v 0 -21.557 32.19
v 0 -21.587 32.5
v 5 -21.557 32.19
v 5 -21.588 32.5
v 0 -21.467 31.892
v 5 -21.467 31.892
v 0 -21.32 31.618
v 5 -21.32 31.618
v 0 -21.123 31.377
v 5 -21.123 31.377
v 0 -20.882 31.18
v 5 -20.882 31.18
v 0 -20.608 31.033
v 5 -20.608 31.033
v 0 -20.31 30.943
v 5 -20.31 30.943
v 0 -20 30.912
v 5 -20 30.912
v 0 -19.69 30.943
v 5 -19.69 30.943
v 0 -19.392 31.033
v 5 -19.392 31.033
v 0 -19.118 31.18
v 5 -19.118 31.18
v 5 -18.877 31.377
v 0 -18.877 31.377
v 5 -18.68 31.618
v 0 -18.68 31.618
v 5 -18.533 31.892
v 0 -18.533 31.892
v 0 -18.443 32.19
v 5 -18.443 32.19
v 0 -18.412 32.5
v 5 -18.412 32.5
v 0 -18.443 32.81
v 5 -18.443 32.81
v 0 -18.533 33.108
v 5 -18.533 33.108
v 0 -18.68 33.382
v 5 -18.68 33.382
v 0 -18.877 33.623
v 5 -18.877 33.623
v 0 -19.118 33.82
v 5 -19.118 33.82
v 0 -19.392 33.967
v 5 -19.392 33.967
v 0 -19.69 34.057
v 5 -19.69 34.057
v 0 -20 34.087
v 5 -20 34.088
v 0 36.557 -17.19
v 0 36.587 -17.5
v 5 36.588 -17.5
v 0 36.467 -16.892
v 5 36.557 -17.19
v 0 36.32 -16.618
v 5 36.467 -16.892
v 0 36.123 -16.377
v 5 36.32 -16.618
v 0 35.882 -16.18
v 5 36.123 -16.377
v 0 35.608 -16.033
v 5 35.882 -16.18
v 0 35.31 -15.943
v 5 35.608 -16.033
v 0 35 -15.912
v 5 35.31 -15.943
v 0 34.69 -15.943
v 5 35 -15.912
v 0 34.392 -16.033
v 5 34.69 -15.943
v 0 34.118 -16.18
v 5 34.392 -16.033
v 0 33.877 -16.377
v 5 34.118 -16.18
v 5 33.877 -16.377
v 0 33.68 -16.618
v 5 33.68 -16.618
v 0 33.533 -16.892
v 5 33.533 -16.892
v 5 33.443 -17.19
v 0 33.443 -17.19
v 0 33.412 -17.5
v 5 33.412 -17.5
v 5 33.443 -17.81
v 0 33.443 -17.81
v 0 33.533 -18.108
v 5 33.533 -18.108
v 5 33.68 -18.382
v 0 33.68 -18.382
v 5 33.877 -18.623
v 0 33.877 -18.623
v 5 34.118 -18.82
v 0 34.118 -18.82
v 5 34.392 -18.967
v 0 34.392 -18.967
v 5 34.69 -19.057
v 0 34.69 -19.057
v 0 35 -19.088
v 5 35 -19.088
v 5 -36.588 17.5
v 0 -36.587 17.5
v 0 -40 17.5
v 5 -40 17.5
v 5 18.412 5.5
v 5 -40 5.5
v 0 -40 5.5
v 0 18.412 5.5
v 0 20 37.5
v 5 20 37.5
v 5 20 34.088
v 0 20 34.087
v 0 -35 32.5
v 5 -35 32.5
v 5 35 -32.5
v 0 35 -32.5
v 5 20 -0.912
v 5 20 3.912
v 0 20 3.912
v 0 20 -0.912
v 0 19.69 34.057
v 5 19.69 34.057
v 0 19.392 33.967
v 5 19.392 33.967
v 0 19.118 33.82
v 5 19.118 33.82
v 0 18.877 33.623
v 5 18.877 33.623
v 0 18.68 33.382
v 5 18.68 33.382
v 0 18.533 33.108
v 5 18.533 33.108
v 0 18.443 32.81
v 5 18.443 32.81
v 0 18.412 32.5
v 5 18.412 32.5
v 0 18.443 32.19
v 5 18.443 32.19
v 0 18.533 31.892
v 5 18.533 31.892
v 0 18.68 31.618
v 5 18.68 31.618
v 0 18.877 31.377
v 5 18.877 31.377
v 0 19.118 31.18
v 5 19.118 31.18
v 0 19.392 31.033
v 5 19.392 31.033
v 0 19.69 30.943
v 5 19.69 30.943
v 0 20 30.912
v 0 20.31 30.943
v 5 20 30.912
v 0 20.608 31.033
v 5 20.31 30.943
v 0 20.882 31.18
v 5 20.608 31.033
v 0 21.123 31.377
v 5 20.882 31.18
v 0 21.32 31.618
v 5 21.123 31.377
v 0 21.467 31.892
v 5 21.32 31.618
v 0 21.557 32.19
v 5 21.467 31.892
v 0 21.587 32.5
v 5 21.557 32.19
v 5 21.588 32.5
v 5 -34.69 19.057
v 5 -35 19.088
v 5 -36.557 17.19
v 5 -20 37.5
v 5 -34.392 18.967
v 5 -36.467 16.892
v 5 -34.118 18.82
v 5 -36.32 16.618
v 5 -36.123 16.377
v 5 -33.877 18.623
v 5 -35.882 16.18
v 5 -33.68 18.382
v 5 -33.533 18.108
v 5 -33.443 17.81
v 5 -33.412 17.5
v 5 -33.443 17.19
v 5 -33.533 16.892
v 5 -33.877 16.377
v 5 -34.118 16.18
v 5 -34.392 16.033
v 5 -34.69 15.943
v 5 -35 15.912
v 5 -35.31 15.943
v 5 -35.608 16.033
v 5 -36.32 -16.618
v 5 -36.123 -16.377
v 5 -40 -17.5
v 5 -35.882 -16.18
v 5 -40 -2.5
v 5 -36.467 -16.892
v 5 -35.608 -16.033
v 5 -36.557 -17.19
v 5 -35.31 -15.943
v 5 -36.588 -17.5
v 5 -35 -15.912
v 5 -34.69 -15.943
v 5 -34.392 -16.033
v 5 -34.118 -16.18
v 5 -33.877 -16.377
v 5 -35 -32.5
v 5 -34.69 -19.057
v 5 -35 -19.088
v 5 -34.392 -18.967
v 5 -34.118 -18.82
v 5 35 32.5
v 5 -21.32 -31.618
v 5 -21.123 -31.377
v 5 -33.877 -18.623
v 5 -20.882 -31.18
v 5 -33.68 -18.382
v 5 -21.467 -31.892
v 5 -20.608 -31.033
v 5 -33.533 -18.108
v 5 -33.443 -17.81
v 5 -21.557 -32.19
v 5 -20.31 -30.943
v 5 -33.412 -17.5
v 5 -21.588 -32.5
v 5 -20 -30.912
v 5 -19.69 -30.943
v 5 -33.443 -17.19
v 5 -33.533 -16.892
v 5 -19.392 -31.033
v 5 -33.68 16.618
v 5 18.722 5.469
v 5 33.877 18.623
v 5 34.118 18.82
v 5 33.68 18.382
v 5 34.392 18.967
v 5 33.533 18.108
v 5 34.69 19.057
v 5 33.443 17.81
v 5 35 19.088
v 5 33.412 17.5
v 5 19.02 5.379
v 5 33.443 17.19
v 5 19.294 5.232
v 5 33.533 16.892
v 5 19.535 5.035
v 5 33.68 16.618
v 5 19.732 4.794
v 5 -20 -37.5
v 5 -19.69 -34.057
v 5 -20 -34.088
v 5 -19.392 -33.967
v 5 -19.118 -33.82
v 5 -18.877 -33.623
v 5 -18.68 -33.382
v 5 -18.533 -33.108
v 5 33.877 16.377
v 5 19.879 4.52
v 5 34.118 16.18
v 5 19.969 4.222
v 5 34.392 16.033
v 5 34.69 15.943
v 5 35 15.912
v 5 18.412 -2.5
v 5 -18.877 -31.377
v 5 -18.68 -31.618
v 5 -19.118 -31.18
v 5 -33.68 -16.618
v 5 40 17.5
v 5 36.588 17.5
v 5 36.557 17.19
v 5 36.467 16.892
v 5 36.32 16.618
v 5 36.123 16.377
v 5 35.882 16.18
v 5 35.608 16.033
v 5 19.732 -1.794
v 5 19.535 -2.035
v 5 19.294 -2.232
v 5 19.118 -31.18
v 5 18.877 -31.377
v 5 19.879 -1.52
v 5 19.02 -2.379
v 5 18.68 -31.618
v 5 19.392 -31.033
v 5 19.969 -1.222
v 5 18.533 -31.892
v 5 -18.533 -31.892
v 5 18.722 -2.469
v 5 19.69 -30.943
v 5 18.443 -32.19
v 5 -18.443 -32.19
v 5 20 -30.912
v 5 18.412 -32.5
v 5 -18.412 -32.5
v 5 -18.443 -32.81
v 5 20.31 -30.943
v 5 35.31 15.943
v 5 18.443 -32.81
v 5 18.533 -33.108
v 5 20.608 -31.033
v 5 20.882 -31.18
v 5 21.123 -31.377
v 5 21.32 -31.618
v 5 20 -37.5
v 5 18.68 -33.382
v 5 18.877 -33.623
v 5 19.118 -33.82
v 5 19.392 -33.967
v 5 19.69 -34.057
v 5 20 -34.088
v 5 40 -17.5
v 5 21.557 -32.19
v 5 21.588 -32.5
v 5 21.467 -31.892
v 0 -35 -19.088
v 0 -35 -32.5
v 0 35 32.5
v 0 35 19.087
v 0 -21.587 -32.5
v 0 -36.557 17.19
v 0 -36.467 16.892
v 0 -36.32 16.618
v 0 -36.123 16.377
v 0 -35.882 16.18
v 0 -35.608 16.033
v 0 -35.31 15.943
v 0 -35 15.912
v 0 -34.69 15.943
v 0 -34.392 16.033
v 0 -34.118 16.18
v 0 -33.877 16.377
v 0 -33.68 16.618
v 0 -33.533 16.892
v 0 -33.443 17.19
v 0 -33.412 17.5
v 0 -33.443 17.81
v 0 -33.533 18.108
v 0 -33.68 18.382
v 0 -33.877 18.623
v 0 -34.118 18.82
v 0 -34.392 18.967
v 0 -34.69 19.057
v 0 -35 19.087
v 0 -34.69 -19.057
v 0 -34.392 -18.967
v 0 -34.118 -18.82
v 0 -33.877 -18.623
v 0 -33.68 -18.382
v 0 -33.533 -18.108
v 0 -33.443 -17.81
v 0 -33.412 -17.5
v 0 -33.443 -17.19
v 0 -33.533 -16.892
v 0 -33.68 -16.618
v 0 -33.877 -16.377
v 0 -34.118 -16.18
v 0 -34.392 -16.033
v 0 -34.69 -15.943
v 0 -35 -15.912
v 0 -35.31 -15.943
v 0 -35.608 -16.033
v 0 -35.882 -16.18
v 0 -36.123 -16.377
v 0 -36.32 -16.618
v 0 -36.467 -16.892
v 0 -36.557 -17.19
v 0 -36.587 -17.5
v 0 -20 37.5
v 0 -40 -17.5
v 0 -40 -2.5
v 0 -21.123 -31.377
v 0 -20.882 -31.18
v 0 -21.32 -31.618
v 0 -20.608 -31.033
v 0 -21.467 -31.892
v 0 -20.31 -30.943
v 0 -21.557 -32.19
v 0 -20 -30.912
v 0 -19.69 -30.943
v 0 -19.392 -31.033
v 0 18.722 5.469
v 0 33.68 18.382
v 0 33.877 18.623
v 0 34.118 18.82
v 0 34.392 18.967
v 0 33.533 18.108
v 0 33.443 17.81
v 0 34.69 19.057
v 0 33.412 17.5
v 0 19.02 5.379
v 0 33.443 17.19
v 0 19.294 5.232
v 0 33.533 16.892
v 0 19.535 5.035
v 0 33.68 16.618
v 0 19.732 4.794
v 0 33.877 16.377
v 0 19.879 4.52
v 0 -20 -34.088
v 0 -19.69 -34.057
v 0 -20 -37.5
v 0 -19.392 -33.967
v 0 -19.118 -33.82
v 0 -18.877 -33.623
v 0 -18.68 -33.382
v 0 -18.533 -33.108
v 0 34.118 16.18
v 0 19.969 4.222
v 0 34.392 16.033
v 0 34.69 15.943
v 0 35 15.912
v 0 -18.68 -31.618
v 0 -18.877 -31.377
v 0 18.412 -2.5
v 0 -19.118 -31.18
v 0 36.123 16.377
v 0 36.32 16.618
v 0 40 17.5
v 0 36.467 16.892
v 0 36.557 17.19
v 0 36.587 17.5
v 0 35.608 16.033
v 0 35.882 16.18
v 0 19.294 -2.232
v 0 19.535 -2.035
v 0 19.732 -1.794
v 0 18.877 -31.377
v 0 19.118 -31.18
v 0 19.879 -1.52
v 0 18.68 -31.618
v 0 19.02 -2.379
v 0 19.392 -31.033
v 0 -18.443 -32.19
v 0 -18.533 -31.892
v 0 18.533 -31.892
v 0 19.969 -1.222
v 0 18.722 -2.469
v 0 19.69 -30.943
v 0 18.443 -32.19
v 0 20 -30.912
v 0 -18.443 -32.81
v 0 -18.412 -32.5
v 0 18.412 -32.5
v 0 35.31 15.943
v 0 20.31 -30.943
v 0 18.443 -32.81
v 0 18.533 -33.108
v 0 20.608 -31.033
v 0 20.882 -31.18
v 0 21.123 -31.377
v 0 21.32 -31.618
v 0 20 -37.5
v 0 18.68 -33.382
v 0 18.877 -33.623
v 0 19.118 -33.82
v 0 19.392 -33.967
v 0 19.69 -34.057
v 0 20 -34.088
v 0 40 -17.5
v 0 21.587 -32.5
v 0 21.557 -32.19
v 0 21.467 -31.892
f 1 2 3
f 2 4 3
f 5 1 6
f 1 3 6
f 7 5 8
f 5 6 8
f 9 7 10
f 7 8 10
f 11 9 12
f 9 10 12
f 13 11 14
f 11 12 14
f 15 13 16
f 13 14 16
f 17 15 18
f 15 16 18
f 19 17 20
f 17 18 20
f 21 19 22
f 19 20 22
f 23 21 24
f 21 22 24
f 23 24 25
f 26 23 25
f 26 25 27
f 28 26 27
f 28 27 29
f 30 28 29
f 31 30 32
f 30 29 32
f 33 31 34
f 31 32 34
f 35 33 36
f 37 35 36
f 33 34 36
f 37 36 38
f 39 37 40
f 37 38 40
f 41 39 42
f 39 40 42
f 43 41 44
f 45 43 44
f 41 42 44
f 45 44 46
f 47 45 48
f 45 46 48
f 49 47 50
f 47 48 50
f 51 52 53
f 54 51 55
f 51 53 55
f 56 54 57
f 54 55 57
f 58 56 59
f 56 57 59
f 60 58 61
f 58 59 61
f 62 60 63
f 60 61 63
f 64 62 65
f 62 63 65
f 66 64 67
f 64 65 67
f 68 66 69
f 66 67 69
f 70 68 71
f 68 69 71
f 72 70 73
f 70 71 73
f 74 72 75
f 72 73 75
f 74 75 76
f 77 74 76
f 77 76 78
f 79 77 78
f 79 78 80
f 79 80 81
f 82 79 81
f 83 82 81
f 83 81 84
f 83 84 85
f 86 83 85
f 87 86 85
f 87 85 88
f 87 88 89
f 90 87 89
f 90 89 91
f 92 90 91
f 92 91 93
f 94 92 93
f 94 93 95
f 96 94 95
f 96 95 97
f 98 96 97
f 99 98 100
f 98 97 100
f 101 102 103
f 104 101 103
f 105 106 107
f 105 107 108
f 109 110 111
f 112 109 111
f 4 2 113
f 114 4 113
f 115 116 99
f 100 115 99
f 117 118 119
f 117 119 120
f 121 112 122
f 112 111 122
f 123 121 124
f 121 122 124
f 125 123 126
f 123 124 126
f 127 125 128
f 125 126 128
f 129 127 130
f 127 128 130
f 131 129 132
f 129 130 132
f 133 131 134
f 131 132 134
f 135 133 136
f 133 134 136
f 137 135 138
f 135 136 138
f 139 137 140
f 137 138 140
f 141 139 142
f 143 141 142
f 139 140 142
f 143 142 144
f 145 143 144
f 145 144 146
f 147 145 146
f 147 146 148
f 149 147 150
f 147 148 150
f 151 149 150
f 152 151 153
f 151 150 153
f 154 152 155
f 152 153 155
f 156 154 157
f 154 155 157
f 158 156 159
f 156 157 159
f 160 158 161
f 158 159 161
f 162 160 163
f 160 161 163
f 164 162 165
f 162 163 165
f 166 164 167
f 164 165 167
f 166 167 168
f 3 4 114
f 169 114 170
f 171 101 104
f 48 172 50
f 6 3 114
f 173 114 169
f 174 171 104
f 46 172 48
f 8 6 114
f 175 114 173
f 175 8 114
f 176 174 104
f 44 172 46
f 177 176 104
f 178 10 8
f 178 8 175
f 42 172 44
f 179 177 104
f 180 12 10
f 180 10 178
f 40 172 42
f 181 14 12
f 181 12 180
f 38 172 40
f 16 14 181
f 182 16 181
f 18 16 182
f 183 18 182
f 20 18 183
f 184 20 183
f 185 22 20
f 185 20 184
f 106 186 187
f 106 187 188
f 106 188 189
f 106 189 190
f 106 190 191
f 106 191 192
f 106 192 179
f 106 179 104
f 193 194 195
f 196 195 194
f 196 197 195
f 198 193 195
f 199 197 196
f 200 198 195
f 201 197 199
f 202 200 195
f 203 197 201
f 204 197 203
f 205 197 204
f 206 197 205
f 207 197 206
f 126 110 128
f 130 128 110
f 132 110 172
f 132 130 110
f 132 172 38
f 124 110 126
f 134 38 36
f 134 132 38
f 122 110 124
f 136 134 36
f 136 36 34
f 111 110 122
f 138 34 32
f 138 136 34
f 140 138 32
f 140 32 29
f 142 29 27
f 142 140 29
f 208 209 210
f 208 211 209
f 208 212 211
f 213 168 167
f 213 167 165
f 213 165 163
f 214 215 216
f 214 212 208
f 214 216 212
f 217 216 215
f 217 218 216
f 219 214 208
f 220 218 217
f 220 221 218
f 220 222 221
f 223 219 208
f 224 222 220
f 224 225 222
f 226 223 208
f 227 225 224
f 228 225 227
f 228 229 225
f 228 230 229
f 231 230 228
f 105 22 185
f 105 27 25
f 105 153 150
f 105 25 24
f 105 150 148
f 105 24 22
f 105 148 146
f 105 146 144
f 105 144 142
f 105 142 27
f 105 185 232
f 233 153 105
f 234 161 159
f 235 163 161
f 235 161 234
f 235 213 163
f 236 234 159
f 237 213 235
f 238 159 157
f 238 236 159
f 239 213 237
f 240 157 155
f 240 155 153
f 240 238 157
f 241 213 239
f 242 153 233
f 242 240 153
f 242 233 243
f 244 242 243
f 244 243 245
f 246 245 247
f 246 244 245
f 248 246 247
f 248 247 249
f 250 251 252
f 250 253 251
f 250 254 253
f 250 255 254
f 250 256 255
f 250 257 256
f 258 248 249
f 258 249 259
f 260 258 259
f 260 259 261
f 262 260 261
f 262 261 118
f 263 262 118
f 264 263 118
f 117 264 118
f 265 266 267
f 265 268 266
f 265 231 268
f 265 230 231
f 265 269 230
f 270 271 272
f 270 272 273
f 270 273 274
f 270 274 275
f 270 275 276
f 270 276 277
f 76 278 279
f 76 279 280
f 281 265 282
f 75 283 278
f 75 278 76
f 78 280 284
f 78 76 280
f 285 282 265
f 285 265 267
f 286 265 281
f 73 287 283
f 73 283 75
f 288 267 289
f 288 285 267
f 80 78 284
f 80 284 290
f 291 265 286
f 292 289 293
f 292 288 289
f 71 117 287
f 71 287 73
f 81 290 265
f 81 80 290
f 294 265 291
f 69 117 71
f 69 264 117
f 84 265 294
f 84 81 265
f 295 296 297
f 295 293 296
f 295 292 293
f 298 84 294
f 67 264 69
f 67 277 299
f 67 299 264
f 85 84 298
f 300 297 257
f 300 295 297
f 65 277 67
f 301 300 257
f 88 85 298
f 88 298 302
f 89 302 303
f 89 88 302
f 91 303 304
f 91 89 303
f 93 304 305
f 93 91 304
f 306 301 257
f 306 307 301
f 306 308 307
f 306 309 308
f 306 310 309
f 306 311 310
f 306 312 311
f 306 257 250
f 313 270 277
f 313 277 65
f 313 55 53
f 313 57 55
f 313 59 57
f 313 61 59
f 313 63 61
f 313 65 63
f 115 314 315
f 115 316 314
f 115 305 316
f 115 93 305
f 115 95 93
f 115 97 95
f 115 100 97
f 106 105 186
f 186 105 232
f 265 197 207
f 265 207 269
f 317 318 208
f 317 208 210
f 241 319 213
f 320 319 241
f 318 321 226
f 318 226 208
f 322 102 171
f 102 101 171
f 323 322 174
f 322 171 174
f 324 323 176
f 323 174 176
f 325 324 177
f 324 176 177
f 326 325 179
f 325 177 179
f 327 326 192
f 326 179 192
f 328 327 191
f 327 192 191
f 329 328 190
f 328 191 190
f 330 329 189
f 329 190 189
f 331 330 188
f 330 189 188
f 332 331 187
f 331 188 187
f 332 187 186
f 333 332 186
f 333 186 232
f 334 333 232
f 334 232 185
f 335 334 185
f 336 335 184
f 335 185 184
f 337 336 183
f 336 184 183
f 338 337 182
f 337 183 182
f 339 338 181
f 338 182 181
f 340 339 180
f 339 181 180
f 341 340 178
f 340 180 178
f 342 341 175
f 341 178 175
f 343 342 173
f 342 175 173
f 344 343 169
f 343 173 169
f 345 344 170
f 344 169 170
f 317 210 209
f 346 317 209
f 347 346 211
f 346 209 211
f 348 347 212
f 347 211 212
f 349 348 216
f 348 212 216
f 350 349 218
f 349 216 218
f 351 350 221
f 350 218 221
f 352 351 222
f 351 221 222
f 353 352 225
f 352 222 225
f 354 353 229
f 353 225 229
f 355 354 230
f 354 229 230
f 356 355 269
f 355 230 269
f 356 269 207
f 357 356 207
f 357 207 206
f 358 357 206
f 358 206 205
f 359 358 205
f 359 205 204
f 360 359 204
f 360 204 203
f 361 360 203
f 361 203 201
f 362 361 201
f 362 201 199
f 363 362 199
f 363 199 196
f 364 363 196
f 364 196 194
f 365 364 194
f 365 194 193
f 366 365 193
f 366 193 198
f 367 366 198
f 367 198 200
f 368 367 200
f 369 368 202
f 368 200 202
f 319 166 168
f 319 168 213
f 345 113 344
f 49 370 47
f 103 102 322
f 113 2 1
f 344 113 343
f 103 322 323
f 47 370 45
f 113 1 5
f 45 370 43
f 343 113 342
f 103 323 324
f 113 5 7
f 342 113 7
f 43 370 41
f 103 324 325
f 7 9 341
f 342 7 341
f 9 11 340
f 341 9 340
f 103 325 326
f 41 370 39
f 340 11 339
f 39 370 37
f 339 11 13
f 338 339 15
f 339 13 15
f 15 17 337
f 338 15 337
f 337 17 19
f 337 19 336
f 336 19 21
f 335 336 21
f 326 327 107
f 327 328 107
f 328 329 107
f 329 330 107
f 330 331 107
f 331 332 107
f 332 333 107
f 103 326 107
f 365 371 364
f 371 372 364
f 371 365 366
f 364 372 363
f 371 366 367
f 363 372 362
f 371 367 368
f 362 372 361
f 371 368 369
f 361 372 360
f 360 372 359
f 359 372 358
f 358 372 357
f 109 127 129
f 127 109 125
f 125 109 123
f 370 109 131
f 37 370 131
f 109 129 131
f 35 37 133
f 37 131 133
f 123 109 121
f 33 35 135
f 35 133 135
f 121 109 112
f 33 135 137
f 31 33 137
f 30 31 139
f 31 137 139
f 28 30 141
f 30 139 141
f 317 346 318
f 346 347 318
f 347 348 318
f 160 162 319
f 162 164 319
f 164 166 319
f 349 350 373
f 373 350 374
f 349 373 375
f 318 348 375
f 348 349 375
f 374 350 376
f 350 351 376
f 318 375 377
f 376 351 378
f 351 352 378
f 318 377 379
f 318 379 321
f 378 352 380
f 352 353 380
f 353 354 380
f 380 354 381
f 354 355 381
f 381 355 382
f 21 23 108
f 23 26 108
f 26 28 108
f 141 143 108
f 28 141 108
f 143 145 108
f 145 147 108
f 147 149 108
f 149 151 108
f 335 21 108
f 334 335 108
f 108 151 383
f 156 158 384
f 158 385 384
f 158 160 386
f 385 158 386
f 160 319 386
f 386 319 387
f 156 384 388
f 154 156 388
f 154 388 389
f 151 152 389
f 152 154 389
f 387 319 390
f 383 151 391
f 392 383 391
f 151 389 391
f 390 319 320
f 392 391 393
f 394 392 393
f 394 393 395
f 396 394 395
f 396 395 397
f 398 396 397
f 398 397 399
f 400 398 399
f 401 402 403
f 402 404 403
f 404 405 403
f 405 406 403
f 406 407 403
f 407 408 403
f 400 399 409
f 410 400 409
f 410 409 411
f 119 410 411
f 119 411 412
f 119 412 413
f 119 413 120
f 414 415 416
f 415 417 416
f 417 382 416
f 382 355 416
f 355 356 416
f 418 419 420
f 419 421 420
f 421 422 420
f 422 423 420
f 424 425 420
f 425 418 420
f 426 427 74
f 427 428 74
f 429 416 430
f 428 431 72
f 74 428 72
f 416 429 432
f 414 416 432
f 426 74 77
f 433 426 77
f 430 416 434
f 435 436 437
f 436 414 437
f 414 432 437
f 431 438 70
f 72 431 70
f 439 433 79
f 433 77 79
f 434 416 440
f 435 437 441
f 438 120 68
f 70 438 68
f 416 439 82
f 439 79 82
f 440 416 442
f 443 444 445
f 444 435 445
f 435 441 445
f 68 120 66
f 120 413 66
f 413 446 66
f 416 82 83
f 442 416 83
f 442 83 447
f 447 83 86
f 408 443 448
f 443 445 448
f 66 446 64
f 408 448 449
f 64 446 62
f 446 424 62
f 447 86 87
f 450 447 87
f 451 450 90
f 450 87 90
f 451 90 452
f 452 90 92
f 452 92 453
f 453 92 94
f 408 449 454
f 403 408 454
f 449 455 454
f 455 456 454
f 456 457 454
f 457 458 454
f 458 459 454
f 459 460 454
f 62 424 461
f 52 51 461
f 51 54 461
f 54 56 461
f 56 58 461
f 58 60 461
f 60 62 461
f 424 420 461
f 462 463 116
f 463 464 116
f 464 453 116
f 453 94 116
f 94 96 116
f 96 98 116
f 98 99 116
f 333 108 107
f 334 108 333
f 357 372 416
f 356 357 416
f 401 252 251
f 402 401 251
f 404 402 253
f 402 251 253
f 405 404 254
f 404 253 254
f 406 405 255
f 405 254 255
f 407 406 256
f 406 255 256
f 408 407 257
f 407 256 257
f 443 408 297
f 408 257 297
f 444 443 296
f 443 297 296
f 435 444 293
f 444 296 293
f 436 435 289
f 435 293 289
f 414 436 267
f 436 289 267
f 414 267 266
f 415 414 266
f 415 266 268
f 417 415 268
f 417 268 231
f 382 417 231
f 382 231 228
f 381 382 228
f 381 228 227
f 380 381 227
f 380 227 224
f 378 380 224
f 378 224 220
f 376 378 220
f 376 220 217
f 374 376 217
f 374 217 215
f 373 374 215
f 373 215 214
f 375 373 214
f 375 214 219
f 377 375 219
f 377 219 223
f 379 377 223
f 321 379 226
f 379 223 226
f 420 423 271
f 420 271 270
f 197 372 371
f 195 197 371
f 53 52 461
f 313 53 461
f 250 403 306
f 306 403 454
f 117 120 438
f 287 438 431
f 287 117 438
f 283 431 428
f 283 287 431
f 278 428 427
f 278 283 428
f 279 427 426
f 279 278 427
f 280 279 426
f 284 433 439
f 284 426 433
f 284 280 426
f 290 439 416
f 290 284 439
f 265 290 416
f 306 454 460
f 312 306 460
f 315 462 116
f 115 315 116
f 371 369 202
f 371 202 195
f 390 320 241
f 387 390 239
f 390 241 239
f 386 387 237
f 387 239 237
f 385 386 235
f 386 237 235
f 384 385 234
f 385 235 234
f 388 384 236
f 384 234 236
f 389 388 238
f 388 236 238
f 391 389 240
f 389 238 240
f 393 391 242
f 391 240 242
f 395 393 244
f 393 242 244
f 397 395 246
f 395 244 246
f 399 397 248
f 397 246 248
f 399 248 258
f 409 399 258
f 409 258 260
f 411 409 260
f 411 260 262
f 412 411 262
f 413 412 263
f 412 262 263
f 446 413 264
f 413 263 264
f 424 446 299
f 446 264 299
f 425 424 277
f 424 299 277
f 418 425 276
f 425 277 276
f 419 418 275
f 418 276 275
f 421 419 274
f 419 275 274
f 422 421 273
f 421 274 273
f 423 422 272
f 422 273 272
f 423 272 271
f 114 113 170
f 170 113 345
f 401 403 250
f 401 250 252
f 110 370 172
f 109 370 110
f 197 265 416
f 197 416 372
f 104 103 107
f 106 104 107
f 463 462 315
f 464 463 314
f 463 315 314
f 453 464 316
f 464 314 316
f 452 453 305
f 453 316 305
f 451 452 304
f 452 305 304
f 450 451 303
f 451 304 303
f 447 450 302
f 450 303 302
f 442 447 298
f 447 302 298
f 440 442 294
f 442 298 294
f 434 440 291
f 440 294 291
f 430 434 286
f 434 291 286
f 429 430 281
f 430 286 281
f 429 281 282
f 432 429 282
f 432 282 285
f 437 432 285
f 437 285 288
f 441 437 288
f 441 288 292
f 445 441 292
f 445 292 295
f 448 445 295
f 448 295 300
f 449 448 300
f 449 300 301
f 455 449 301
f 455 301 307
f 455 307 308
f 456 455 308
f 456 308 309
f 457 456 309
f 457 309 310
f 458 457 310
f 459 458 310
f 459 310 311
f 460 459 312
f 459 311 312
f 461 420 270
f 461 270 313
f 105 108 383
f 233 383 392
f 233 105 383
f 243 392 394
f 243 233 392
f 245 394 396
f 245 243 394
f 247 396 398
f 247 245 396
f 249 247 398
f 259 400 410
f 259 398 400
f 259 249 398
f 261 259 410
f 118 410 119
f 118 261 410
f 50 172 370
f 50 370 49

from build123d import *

# Parameters (mm, degrees)
SKETCH1_W                                = 75
SKETCH1_H                                = 80
BOSS_EXTRUDE1_DEPTH                      = 5
CUT_EXTRUDE1_START                       = -6
CUT_EXTRUDE1_DEPTH                       = 7
MIRROR1_START                            = -6
MIRROR1_AT_THE_SECOND_PLANE_COPY_1_DEPTH = 7
CUT_EXTRUDE2_DEPTH                       = 1
CUT_EXTRUDE2_DEPTH_BACK                  = 6
SKETCH5_R                                = 1.5875
CUT_EXTRUDE3_DEPTH                       = 6


with BuildPart() as part:
    # Sketch1 → Boss-Extrude1 (new body)
    with BuildSketch(Plane(origin=(0, 0, 0), x_dir=(0, 0, -1), z_dir=(1, 0, 0))):
        Rectangle(SKETCH1_W, SKETCH1_H)
    extrude(amount=BOSS_EXTRUDE1_DEPTH)

    # Sketch3 → Cut-Extrude1 (cut)
    with BuildSketch(Plane(origin=(5, 0, 0), x_dir=(0, 0, -1), z_dir=(1, 0, 0)).offset(CUT_EXTRUDE1_START)):
        Polygon((-37.5, 20), (-32.5, 20), (-32.5, 35), (-17.5, 35), (-17.5, 40), (-37.5, 40), align=None)
    cut_extrude1 = extrude(amount=CUT_EXTRUDE1_DEPTH, mode=Mode.SUBTRACT)

    # Mirror1: Cut-Extrude1 across plane
    add(cut_extrude1.mirror(Plane.XY), mode=Mode.SUBTRACT)

    # Mirror1 at the second plane: Cut-Extrude1 across plane
    add(cut_extrude1.mirror(Plane.ZX), mode=Mode.SUBTRACT)

    # Mirror1 at the second plane copy 1 sketc → Mirror1 at the second plane copy 1 (cut)
    with BuildSketch(Plane(origin=(5, 0, 0), x_dir=(0, 0, 1), z_dir=(1, 0, 0)).offset(MIRROR1_START)):
        Polygon((-37.5, 20), (-32.5, 20), (-32.5, 35), (-17.5, 35), (-17.5, 40), (-37.5, 40), align=None)
    extrude(amount=MIRROR1_AT_THE_SECOND_PLANE_COPY_1_DEPTH, mode=Mode.SUBTRACT)

    # Sketch4 → Cut-Extrude2 (cut, two sides)
    with BuildSketch(Plane(origin=(5, 0, 0), x_dir=(0, 0, -1), z_dir=(1, 0, 0))) as cut_extrude2_sk:
        with BuildLine():
            Line((-5.5, -40), (-5.5, 18.4125))
            ThreePointArc((-5.5, 18.4125), (-5.035032015, 19.535032015), (-3.9125, 20))
            Line((-3.9125, 20), (0.9125, 20))
            ThreePointArc((0.9125, 20), (2.035032015, 19.535032015), (2.5, 18.4125))
            Line((2.5, 18.4125), (2.5, -40))
            Line((2.5, -40), (-5.5, -40))
        make_face()
    extrude(amount=CUT_EXTRUDE2_DEPTH, mode=Mode.SUBTRACT)
    extrude(cut_extrude2_sk.sketch, amount=-CUT_EXTRUDE2_DEPTH_BACK, mode=Mode.SUBTRACT)

    # Sketch5 → Cut-Extrude3 (cut, through all)
    with BuildSketch(Plane(origin=(5, 0, 0), x_dir=(0, 0, -1), z_dir=(1, 0, 0))):
        with Locations((-17.5, 35)):
            Circle(SKETCH5_R)
        with Locations((-32.5, 20)):
            Circle(SKETCH5_R)
        with Locations((17.5, 35)):
            Circle(SKETCH5_R)
        with Locations((32.5, 20)):
            Circle(SKETCH5_R)
        with Locations((32.5, -20)):
            Circle(SKETCH5_R)
        with Locations((17.5, -35)):
            Circle(SKETCH5_R)
        with Locations((-17.5, -35)):
            Circle(SKETCH5_R)
        with Locations((-32.5, -20)):
            Circle(SKETCH5_R)
    extrude(amount=-CUT_EXTRUDE3_DEPTH, mode=Mode.SUBTRACT)


solid = part.part
